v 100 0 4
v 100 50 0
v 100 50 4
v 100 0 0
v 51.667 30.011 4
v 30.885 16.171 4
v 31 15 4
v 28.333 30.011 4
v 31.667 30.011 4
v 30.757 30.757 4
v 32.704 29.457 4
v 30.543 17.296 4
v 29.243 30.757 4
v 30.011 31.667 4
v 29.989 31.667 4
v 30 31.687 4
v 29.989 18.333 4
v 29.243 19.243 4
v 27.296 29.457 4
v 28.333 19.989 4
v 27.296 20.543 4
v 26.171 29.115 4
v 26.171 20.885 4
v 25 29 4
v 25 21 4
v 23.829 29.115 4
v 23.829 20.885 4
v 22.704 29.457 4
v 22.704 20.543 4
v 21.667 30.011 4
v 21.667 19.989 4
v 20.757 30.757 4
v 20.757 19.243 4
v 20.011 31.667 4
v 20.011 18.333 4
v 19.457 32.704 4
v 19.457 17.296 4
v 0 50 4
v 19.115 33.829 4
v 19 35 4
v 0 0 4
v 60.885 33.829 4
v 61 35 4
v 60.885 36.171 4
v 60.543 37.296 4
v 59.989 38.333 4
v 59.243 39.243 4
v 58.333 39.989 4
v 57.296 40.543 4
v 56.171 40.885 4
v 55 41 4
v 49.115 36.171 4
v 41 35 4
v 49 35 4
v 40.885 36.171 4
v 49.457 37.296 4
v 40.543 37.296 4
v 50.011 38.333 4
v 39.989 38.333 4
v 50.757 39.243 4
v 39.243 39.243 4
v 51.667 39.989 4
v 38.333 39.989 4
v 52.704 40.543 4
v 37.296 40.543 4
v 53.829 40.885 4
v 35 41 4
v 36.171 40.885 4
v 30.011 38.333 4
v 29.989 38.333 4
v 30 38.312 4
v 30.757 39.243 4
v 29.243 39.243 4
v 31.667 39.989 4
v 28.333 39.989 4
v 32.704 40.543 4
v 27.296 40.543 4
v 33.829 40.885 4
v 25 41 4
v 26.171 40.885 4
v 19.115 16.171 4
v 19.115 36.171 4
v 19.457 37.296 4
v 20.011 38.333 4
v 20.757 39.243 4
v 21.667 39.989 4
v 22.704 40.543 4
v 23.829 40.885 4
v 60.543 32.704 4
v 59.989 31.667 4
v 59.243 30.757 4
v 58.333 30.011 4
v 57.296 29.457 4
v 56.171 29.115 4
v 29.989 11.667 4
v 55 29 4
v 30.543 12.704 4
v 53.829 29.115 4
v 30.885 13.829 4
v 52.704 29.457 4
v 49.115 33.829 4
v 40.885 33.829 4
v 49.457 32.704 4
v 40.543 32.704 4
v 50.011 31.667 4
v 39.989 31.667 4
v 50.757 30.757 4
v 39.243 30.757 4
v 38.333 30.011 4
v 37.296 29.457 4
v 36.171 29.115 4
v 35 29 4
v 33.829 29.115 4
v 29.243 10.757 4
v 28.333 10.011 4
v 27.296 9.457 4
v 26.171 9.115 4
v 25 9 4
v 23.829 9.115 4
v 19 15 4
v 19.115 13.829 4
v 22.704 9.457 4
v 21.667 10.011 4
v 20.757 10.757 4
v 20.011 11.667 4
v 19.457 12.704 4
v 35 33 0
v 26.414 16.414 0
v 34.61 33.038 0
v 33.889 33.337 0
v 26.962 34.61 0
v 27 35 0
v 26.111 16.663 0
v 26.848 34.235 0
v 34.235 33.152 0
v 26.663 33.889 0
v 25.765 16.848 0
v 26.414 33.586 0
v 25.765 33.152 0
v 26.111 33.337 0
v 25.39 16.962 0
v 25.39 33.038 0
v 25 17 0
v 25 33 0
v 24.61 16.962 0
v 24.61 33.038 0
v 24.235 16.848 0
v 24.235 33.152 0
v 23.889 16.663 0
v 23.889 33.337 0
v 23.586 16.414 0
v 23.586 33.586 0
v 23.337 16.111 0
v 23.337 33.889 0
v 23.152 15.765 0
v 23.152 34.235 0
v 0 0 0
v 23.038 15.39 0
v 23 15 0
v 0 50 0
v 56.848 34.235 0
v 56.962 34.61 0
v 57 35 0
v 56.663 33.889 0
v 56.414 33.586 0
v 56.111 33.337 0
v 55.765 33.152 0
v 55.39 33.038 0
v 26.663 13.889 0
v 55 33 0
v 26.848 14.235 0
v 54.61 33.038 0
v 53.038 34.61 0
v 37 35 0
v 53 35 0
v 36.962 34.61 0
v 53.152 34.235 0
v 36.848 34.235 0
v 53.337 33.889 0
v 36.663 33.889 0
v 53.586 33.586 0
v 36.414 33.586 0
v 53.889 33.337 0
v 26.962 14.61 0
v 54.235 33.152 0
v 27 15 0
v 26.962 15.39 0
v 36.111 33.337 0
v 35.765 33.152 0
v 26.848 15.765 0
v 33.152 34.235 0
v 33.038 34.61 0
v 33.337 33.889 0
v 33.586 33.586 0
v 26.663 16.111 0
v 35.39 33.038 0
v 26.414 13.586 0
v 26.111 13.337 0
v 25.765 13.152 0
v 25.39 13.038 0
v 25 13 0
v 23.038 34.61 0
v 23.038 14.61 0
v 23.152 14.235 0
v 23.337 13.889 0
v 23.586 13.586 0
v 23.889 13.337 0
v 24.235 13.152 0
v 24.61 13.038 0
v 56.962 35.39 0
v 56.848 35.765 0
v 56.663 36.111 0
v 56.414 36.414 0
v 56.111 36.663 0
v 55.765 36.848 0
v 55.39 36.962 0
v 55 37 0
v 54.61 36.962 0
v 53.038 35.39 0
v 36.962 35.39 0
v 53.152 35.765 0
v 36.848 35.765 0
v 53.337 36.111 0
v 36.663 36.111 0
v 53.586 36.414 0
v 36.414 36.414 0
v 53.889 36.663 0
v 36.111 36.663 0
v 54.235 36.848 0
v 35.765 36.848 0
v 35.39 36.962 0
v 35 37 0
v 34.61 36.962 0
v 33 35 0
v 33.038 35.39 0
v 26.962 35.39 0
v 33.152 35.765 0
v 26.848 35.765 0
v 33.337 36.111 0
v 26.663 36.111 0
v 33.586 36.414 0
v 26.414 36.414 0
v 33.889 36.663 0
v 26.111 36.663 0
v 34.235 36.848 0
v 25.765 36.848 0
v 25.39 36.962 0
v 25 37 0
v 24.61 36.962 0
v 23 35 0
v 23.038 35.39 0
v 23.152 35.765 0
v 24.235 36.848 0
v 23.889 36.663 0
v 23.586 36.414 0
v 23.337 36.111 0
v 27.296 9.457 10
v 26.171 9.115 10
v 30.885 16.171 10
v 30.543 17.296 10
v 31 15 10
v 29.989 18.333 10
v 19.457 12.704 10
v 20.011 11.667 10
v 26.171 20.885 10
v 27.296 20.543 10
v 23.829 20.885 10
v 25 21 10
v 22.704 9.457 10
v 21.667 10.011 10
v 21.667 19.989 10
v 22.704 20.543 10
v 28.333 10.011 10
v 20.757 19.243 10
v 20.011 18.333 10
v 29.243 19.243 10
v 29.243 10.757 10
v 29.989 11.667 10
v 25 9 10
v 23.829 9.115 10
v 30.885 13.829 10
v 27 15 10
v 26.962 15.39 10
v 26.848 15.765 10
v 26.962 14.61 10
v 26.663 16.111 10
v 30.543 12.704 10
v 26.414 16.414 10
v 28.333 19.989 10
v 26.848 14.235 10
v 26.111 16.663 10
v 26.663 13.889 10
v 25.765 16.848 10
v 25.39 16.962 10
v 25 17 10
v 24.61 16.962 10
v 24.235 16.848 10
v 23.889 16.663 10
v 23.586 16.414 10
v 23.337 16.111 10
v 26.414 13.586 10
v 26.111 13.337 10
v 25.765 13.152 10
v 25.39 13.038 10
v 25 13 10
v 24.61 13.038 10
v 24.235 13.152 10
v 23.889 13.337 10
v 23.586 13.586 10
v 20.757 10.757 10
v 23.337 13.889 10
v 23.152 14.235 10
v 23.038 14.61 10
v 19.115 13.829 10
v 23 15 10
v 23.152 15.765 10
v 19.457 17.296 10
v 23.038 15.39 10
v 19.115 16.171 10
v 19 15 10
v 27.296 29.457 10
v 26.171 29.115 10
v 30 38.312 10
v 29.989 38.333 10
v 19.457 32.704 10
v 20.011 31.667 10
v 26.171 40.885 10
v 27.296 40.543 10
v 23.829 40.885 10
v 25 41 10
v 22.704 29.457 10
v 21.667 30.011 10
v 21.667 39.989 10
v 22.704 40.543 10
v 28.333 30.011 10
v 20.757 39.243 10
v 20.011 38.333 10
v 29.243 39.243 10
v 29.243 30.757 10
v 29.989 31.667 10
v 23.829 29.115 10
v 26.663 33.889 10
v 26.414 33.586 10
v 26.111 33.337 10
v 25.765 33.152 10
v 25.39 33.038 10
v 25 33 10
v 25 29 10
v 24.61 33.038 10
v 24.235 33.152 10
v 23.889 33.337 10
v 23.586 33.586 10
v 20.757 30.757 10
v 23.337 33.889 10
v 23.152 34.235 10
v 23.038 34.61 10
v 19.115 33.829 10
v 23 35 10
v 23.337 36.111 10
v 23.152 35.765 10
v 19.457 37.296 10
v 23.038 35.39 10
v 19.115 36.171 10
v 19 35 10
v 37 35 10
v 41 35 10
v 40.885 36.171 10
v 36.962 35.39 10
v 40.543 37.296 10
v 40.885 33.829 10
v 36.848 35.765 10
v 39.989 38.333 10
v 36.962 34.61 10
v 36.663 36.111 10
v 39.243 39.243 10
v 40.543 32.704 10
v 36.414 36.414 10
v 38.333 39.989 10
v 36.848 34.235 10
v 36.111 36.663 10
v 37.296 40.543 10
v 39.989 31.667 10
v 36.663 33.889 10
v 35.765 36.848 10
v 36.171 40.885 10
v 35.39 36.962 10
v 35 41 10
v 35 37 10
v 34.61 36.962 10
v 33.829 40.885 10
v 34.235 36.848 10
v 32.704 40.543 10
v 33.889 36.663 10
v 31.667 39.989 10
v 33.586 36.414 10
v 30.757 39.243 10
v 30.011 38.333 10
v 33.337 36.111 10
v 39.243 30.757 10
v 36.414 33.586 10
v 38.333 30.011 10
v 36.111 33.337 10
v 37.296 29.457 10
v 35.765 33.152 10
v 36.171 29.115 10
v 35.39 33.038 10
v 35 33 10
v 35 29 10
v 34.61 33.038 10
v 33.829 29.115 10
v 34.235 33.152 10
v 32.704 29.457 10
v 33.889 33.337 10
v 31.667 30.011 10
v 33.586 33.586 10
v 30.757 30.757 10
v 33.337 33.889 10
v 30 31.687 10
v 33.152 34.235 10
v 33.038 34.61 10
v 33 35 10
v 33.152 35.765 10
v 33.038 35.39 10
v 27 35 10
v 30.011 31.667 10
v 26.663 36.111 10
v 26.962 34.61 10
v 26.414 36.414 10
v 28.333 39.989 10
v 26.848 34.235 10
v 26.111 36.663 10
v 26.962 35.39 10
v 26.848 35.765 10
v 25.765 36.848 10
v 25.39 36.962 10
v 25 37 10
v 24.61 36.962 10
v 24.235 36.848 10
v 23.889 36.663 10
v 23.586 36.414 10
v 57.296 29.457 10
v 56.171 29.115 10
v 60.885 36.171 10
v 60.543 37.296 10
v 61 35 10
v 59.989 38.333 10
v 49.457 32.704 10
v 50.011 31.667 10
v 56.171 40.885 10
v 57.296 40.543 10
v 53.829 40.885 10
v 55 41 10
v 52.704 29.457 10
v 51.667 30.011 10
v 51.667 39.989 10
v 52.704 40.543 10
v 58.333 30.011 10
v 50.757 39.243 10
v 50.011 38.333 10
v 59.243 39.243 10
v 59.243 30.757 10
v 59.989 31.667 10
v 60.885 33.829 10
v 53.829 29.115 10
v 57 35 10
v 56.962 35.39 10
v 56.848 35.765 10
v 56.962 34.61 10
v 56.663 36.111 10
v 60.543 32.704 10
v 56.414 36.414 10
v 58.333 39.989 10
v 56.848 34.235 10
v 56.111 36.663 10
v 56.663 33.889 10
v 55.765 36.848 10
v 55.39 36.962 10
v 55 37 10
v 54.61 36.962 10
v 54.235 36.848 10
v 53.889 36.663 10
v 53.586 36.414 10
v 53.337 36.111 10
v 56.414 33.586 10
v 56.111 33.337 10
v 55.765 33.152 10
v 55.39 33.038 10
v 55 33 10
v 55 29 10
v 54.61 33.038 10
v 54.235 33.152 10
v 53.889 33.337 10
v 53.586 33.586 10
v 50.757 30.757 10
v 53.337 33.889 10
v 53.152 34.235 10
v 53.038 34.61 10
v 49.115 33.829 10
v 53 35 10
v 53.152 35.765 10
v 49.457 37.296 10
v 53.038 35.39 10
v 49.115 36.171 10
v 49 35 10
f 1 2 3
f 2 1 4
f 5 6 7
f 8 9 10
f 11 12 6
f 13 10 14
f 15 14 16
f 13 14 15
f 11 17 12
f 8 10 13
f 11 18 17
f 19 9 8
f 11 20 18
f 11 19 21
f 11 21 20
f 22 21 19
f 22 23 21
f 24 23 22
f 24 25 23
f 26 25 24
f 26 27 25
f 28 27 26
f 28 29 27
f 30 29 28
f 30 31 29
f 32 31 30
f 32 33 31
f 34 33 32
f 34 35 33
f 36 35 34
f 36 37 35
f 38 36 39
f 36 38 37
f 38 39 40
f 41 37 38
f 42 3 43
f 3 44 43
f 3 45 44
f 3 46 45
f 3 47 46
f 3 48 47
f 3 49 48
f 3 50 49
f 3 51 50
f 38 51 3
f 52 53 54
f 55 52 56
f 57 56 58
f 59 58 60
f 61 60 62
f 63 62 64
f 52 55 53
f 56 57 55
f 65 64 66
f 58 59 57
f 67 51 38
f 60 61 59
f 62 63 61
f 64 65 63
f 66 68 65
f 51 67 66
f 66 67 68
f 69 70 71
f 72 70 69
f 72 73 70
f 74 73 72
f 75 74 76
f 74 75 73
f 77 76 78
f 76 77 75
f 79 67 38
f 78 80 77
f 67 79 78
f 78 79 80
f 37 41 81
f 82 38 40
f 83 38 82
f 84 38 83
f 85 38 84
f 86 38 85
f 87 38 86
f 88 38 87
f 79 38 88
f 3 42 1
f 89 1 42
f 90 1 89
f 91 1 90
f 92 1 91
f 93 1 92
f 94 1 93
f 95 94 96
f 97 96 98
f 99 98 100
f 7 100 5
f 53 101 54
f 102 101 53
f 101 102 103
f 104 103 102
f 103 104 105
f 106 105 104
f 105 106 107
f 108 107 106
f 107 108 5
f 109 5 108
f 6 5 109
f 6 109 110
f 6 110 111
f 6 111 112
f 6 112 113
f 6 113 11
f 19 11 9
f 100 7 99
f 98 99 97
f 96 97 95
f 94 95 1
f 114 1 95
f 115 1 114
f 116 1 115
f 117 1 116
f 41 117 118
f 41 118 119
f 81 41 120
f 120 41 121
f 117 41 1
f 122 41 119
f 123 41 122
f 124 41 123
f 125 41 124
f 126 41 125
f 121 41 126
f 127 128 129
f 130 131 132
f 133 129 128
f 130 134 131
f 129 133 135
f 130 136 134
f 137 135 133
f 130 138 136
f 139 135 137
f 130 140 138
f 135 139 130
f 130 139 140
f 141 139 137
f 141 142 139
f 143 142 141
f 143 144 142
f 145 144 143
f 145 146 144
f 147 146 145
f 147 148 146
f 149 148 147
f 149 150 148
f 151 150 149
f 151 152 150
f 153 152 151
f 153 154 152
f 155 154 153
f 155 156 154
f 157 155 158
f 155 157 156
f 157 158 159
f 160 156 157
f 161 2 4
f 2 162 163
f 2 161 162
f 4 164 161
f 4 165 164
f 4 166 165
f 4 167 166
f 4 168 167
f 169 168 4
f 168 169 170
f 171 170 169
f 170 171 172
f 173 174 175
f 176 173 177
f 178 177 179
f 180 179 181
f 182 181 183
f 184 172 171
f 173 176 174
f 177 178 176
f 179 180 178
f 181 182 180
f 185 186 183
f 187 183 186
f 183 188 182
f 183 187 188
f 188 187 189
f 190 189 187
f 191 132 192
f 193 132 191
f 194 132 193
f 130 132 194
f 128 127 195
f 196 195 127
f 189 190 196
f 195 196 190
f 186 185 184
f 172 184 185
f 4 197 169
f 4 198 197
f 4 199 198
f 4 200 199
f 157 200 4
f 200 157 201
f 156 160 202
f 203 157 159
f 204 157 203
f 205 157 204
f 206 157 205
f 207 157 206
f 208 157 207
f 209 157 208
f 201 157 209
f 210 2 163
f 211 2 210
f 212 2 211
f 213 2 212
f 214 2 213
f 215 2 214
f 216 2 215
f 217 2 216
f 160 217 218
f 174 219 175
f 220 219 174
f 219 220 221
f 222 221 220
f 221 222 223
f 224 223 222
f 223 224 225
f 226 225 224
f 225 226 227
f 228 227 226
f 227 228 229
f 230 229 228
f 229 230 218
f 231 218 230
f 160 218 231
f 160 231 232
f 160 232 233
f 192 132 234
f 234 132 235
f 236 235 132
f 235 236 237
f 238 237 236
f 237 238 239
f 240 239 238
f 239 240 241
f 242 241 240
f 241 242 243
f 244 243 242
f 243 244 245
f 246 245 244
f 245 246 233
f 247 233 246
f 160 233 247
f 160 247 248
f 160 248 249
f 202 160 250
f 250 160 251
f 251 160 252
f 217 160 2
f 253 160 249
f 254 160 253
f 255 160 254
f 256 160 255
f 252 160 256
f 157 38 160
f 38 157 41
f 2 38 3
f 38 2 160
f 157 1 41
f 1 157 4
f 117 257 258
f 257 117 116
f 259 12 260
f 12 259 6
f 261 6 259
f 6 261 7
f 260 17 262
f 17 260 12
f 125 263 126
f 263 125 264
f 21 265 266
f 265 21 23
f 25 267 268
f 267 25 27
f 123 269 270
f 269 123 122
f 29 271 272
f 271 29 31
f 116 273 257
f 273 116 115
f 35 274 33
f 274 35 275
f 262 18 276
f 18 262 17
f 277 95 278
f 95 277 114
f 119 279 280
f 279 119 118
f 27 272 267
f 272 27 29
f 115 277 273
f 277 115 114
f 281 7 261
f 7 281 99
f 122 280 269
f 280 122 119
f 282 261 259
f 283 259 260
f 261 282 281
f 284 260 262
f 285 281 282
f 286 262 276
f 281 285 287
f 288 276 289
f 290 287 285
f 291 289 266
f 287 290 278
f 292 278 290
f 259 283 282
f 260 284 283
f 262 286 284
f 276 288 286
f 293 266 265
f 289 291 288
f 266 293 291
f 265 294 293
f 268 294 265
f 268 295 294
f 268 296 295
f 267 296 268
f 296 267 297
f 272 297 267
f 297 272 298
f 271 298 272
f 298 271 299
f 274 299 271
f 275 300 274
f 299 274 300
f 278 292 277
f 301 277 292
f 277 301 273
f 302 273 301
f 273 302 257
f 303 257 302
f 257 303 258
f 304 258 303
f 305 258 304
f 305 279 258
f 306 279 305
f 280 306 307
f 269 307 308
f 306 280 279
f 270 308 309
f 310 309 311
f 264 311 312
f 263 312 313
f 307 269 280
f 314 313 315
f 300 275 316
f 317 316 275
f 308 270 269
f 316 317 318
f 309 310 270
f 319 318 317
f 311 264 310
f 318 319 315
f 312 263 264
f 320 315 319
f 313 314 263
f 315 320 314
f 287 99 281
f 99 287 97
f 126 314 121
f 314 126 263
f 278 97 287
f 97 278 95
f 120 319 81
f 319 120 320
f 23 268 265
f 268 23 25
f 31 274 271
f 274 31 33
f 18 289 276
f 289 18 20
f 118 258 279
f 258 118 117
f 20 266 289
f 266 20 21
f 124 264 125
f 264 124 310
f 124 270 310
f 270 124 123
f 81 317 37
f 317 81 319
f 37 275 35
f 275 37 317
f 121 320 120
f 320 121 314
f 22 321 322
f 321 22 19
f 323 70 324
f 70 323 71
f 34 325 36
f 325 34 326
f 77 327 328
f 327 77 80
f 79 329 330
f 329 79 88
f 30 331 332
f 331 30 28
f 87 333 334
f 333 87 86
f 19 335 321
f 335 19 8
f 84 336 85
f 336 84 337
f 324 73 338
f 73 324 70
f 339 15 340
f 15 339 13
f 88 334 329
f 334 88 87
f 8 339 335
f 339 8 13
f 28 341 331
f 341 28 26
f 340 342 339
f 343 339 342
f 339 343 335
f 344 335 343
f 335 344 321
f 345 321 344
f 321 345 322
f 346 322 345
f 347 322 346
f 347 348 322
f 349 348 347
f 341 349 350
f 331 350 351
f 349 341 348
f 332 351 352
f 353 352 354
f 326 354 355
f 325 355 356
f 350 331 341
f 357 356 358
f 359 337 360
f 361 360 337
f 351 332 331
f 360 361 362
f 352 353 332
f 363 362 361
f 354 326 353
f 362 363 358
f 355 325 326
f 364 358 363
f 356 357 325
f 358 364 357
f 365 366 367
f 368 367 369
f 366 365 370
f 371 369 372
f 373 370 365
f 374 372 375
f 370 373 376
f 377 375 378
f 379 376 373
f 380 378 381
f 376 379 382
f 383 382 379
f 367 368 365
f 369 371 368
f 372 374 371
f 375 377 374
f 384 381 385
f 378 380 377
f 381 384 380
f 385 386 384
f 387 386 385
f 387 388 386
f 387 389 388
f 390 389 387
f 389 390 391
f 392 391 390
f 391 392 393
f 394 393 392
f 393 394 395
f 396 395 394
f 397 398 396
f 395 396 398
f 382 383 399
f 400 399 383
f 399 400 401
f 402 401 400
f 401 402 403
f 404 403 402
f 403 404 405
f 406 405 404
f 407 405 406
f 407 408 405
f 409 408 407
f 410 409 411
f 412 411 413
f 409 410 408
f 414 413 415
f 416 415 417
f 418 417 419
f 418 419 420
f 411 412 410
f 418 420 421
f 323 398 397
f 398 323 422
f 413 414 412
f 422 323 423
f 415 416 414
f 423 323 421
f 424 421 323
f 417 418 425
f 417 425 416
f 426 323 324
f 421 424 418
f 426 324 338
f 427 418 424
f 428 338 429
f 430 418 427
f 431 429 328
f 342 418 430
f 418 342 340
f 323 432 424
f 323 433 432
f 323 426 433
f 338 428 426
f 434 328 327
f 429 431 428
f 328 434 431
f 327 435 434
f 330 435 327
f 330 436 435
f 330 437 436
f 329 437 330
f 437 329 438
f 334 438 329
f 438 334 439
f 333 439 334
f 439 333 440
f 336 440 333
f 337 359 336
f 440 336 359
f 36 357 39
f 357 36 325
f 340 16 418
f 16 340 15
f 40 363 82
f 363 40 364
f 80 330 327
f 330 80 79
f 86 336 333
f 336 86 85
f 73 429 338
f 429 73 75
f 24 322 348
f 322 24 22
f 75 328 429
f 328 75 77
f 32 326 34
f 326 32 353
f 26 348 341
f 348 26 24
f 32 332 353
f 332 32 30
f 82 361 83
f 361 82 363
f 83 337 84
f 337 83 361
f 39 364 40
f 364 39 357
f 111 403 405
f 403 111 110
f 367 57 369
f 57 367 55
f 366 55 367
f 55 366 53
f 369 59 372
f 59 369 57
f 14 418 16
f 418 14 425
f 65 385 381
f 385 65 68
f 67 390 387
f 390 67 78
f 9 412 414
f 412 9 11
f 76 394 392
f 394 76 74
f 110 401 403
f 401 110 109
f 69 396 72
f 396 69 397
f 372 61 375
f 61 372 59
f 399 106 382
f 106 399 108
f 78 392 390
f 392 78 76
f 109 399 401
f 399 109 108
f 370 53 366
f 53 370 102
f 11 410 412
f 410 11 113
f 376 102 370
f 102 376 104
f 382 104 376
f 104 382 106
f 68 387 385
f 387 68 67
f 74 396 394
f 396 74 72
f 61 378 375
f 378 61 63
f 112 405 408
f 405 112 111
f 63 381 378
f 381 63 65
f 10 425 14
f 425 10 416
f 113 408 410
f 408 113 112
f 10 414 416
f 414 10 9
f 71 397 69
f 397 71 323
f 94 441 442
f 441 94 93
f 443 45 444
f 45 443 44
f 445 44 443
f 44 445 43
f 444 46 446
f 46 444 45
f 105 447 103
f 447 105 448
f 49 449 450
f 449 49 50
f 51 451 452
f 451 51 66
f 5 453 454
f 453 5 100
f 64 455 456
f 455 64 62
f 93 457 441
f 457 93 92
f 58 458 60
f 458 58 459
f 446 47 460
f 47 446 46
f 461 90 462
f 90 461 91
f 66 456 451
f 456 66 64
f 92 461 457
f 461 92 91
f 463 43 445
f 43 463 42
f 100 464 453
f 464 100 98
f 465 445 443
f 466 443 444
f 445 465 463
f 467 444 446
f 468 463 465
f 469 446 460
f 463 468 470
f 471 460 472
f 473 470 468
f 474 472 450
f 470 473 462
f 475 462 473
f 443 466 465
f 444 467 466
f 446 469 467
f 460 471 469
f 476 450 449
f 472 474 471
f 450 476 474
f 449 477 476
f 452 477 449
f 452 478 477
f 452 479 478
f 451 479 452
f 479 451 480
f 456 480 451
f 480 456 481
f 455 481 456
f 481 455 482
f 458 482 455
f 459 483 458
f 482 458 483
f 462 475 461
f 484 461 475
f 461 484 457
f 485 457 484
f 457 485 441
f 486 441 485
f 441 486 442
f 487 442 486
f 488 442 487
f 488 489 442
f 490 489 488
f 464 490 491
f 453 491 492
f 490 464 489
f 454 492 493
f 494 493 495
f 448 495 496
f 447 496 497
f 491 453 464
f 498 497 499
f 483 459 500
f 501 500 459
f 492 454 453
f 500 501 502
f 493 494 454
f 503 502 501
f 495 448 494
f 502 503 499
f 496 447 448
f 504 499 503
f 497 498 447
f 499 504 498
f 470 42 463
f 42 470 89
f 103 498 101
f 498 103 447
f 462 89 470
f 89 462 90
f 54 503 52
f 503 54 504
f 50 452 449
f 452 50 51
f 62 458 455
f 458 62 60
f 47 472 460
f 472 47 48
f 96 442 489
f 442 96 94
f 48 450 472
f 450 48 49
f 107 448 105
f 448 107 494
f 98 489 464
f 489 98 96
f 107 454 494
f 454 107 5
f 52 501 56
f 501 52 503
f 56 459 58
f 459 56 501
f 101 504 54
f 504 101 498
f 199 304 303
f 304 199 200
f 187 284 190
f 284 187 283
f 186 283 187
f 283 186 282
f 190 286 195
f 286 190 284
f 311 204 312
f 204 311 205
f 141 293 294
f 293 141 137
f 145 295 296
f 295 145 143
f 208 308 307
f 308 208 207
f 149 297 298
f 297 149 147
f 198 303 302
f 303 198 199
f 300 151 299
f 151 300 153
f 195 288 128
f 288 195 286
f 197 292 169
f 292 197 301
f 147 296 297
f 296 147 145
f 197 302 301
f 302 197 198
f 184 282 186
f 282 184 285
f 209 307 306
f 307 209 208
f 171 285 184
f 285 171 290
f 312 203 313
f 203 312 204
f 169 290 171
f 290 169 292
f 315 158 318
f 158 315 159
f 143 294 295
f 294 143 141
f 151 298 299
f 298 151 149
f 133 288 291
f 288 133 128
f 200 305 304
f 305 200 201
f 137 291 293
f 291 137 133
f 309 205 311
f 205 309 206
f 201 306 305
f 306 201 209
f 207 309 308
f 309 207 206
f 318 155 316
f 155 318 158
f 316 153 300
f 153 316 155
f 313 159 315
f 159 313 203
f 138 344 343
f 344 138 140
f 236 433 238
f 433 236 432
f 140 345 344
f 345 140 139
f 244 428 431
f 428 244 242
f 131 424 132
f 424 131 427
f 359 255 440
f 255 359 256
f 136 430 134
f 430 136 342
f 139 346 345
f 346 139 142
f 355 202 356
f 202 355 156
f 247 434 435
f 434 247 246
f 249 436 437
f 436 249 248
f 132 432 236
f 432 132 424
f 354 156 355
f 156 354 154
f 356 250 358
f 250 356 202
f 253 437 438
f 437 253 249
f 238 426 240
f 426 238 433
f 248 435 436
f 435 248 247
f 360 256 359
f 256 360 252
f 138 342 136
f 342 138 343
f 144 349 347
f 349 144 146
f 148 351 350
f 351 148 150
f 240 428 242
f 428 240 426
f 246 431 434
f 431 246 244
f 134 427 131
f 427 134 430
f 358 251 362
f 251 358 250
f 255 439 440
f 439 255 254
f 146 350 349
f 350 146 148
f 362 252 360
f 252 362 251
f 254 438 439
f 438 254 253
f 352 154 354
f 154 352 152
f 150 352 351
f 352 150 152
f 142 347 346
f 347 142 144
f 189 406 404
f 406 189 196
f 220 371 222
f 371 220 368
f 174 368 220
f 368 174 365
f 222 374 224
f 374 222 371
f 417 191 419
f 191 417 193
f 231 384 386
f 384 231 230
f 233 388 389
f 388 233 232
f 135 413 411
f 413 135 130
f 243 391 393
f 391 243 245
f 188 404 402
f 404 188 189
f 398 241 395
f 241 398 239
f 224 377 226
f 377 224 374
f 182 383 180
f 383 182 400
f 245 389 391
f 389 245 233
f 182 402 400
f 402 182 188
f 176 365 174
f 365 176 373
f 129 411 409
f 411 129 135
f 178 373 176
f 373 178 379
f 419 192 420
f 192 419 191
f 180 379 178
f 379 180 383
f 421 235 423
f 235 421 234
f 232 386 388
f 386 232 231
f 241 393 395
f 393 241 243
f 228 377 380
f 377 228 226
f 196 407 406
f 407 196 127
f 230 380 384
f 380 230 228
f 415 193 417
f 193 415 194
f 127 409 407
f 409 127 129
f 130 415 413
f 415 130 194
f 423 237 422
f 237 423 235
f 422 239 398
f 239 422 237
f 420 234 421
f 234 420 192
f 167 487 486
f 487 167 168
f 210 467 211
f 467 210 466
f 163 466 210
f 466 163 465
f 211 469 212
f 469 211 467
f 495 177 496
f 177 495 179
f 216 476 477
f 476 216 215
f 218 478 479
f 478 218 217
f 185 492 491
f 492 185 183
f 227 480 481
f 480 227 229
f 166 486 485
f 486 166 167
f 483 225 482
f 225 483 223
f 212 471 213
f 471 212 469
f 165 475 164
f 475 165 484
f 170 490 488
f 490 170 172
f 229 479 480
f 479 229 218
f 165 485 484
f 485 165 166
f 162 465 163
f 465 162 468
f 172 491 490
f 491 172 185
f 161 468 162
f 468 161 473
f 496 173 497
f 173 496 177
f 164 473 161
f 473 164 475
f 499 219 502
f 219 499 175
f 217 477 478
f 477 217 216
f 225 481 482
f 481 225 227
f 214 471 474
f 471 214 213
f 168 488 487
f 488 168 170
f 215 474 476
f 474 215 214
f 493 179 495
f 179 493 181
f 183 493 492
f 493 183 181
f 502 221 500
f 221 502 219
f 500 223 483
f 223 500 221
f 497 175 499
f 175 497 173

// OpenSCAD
$fn = 32;

// ----------------------------------------------------------------------
// Boss field: plate with bosses at given coordinates
// ----------------------------------------------------------------------

// --- parameters (mm) ---
plate_l = 100;            // plate length, X
plate_w = 50;             // plate width, Y
plate_t = 4;              // plate thickness, Z
boss_d = 12;              // boss diameter
boss_h = 6;               // boss height above the plate
bore_d = 4;               // boss bore

total_h = plate_t + boss_h;  // overall height

difference() {
  union() {
    cube([plate_l, plate_w, plate_t]);
    translate([25, 15, plate_t]) cylinder(h = boss_h, d = boss_d);
    translate([25, 35, plate_t]) cylinder(h = boss_h, d = boss_d);
    translate([35, 35, plate_t]) cylinder(h = boss_h, d = boss_d);
    translate([55, 35, plate_t]) cylinder(h = boss_h, d = boss_d);
  }
  translate([25, 15, -1]) cylinder(h = total_h + 2, d = bore_d);
  translate([25, 35, -1]) cylinder(h = total_h + 2, d = bore_d);
  translate([35, 35, -1]) cylinder(h = total_h + 2, d = bore_d);
  translate([55, 35, -1]) cylinder(h = total_h + 2, d = bore_d);
}
